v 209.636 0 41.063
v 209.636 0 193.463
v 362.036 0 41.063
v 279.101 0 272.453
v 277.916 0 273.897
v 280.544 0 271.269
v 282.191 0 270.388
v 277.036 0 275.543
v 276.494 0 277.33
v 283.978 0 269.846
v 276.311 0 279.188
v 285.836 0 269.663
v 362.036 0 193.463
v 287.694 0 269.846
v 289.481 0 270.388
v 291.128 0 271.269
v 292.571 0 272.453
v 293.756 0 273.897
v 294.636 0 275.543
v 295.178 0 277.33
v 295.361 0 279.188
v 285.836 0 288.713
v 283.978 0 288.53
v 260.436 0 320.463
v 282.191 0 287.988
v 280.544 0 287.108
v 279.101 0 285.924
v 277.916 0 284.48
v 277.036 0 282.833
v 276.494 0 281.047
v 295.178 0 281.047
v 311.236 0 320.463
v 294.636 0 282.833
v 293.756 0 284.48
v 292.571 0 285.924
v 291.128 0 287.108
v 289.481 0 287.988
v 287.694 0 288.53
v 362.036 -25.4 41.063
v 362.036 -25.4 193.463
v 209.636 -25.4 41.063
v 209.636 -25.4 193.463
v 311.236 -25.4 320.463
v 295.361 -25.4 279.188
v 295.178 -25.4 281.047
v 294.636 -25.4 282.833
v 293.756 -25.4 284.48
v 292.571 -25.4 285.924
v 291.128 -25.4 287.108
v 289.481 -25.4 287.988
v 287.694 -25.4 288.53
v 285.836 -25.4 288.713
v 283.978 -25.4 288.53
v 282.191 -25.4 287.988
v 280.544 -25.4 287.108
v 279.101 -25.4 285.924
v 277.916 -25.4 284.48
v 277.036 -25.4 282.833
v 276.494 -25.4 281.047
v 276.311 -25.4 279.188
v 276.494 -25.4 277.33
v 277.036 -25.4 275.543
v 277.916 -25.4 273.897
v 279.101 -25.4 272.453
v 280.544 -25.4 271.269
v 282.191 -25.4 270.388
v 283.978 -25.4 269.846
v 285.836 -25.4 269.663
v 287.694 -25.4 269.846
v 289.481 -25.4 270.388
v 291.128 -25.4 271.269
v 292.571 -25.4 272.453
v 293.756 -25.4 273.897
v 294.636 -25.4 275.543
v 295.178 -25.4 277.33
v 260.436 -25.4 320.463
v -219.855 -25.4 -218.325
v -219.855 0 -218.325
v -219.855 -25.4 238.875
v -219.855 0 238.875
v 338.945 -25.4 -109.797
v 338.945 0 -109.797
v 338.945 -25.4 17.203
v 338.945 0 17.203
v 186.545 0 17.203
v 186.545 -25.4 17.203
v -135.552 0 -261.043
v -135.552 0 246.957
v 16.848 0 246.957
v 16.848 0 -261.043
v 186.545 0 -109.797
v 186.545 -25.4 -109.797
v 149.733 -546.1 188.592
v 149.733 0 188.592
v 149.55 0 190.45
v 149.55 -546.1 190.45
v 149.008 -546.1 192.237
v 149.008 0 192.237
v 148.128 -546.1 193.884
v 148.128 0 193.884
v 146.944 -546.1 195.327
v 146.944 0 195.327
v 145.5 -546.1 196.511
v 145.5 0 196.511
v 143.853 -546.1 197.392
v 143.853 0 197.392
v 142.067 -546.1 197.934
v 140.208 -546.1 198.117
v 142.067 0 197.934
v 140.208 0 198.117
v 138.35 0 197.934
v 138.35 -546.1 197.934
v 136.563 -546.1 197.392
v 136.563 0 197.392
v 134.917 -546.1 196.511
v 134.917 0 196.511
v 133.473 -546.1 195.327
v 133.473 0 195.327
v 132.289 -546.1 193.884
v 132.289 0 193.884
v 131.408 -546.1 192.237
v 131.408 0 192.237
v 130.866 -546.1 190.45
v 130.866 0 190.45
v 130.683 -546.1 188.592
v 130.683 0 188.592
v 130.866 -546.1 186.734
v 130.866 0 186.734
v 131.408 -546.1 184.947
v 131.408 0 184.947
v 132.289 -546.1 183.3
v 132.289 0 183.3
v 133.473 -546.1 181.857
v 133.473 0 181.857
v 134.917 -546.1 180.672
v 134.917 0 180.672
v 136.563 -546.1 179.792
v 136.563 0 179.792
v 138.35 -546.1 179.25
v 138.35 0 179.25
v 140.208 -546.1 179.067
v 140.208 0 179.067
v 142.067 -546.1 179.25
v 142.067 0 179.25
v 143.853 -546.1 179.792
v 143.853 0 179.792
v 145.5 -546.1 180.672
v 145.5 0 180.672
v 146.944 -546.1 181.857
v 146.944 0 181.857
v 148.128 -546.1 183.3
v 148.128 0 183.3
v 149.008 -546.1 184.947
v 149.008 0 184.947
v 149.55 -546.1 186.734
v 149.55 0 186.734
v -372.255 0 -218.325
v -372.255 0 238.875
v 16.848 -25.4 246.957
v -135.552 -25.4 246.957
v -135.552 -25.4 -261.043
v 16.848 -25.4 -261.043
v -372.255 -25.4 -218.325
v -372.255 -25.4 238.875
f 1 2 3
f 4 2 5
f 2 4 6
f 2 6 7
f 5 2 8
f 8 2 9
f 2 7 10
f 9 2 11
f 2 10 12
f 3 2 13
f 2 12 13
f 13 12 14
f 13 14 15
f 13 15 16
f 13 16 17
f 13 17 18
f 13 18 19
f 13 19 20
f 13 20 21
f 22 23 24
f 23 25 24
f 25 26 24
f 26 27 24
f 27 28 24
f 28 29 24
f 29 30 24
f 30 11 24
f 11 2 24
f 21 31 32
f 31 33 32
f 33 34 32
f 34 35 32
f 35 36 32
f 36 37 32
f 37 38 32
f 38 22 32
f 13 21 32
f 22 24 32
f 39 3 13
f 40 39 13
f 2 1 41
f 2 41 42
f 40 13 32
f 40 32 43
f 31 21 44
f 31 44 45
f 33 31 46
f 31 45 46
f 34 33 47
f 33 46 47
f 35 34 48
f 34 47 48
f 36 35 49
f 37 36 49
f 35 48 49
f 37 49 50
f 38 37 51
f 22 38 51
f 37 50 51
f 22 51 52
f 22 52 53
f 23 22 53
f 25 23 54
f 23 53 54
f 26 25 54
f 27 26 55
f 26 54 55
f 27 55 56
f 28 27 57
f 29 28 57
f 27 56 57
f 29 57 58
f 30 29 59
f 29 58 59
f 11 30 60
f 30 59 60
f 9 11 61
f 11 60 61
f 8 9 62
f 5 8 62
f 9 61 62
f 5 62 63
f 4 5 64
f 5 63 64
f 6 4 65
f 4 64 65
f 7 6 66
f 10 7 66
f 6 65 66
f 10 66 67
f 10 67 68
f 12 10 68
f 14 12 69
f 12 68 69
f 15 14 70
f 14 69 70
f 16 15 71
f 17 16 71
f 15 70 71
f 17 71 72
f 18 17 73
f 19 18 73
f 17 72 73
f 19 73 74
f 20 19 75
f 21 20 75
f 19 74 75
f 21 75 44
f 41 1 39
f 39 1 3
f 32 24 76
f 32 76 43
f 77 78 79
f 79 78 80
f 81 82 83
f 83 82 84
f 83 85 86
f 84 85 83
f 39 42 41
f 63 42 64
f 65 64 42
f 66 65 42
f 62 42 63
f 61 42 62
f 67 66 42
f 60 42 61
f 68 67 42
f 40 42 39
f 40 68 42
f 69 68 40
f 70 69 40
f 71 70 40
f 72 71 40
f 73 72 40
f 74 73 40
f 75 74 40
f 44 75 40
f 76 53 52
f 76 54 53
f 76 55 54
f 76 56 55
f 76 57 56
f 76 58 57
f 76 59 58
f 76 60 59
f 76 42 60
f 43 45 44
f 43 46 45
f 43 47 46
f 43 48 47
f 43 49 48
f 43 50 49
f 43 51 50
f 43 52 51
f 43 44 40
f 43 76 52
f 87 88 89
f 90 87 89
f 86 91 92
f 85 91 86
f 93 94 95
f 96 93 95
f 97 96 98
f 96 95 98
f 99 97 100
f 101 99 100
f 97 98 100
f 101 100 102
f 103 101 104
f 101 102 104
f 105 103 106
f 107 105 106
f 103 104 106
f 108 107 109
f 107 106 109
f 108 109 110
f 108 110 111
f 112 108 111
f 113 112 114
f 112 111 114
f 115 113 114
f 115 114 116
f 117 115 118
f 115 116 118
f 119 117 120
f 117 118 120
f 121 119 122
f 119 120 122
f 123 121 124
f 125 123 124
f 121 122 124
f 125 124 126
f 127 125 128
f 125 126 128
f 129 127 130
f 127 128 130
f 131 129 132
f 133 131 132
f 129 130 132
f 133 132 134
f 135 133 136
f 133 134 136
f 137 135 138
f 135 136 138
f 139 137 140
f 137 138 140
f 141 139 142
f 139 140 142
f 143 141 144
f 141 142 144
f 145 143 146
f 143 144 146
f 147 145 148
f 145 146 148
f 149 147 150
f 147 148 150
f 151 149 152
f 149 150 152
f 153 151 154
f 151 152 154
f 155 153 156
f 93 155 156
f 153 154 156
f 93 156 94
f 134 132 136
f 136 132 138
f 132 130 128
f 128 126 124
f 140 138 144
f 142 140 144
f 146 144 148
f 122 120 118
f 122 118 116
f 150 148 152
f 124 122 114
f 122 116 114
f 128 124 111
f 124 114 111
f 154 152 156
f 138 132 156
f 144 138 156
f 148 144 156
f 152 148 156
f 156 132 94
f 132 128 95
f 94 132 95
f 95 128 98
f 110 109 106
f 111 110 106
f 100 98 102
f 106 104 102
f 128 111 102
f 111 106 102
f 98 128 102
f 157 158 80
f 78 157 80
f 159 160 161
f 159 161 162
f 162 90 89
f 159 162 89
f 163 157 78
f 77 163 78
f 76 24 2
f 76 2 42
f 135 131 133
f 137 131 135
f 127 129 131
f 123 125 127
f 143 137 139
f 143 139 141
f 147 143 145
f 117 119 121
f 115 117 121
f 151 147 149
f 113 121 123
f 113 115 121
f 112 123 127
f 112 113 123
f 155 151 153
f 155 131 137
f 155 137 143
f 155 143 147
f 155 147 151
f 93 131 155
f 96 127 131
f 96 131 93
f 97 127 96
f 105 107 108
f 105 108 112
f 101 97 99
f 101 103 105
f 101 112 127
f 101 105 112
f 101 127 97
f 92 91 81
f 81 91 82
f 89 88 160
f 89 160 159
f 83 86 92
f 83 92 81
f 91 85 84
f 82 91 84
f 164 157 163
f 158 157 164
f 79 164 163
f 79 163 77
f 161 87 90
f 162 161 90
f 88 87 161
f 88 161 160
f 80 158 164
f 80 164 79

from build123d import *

# Parameters (mm, degrees)
F0_W       = 152.4
F0_H       = 457.2
F1_DEPTH   = 25.4
F0_H_2     = 508
F0_H_3     = 127
F0_H_4     = 279.4
F2_SIZE2   = 50.8
F2_SIZE    = 127
F2_2_SIZE2 = 50.8
F2_2_SIZE  = 127
F3_R       = 9.525
F4_DEPTH   = 25.4
F0_R       = 9.525
F5_DEPTH   = 546.1


# Not quite as in the source:
# - a feature names something its author has since deleted; it is built from what else it names


with BuildPart() as f1:
    # F0 (on Front) → F1 (new body)
    with BuildSketch(Plane.XZ):
        with Locations((-296.0551465034, 10.2754430532)):
            Rectangle(F0_W, F0_H)
    extrude(amount=F1_DEPTH)


with BuildPart() as f1b:
    # F0 (on Front) → F1, piece 2 (new body)
    with BuildSketch(Plane.XZ):
        with Locations((-59.3524523611, -7.0427302271)):
            Rectangle(F0_W, F0_H_2)
    extrude(amount=F1_DEPTH)


with BuildPart() as f1c:
    # F0 (on Front) → F1, piece 3 (new body)
    with BuildSketch(Plane.XZ):
        with Locations((262.744880271, -46.2972840071)):
            Rectangle(F0_W, F0_H_3)
    extrude(amount=F1_DEPTH)


with BuildPart() as f1d:
    # F0 (on Front) → F1, piece 4 (new body)
    with BuildSketch(Plane.XZ):
        with Locations((285.8357941628, 180.763323617)):
            Rectangle(F0_W, F0_H_4)
    extrude(amount=F1_DEPTH)

    # F2
    f2_edges = [f1d.edges().sort_by_distance(p)[0] for p in [
        (362.035794, -12.7, 320.463324),
    ]]
    f2_side = f1d.faces().sort_by_distance((362.035794, -12.7, 180.763324))[0]
    chamfer(f2_edges, length=F2_SIZE, length2=F2_SIZE2, reference=f2_side)

    # F2#2
    f2_2_edges = [f1d.edges().sort_by_distance(p)[0] for p in [
        (209.635794, -12.7, 320.463324),
    ]]
    f2_2_side = f1d.faces().sort_by_distance((209.635794, -12.7, 180.763324))[0]
    chamfer(f2_2_edges, length=F2_2_SIZE, length2=F2_2_SIZE2, reference=f2_2_side)

    # F3 (on face) → F4 (cut)
    with BuildSketch(Plane.XZ.offset(25.4)):
        with Locations((285.8357941628, 279.188323617)):
            Circle(F3_R)
    extrude(amount=-F4_DEPTH, mode=Mode.SUBTRACT)


with BuildPart() as f5:
    # F0 (on Front) → F5 (new body)
    with BuildSketch(Plane.XZ):
        with Locations((140.208363533, 188.591748476)):
            Circle(F0_R)
    extrude(amount=F5_DEPTH)


solid = Compound([f1.part, f1b.part, f1c.part, f1d.part, f5.part])
